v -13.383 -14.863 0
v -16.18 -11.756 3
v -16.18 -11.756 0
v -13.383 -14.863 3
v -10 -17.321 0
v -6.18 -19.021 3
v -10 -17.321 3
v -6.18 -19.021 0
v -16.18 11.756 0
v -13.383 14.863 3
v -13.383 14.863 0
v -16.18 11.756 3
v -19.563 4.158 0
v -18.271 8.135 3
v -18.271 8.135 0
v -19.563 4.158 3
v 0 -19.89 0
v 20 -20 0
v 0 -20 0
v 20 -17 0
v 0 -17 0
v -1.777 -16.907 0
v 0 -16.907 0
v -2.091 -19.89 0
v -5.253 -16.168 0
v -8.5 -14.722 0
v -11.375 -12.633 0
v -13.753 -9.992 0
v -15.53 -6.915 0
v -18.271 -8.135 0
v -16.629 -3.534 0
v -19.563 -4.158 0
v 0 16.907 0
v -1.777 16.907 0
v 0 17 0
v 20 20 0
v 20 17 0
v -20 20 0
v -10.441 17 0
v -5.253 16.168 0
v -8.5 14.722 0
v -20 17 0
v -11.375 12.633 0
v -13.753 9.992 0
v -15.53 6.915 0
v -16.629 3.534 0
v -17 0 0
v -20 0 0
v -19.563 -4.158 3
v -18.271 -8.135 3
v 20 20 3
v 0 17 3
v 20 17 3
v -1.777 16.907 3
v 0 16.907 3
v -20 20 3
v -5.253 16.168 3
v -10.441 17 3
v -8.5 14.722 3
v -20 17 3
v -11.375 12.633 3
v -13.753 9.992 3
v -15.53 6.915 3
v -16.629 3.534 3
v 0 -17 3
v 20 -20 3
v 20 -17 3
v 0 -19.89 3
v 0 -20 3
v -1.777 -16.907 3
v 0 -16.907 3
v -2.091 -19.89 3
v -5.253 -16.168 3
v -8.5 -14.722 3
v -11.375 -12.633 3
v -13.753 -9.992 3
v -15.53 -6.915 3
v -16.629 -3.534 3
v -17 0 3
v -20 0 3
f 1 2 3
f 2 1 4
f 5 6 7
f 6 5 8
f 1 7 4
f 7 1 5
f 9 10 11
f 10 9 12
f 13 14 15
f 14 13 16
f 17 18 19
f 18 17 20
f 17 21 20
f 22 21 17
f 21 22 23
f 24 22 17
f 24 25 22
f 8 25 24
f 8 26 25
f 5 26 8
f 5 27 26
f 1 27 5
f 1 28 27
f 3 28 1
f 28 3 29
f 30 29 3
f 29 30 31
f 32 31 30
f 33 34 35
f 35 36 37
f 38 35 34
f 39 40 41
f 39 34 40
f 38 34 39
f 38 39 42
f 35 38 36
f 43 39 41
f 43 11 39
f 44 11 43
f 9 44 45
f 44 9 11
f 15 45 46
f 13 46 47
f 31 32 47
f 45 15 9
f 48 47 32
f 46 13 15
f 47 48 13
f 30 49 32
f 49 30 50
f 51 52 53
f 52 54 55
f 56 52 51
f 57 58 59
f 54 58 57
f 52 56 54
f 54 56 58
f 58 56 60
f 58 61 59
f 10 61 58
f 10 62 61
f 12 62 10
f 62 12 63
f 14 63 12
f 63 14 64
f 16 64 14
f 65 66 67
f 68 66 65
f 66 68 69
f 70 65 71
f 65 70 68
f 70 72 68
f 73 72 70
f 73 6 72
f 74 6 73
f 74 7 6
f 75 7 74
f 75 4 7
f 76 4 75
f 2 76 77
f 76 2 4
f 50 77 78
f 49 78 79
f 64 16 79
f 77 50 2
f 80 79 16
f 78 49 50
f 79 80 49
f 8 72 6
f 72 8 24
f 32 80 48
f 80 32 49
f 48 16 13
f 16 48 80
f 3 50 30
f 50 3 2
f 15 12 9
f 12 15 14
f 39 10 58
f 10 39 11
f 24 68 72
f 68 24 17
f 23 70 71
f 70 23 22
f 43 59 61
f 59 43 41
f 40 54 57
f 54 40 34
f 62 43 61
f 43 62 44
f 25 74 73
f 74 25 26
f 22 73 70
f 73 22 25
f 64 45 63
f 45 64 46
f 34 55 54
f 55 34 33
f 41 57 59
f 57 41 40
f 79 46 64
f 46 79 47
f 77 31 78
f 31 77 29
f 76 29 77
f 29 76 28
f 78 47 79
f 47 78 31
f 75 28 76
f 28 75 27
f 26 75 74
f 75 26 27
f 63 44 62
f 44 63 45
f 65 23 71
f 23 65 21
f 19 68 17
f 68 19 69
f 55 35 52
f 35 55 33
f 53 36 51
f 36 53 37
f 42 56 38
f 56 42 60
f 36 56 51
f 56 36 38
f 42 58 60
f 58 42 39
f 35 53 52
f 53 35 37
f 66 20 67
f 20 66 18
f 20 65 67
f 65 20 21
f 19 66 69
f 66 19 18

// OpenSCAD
difference(){
cylinder(3,20,20);
cylinder(3,17,17);
translate([0,-20,0]) cube(40);
}
translate([-20,17,0])
cube([40,3,3]);
translate([0,-20,0])
cube([20,3,3]);
